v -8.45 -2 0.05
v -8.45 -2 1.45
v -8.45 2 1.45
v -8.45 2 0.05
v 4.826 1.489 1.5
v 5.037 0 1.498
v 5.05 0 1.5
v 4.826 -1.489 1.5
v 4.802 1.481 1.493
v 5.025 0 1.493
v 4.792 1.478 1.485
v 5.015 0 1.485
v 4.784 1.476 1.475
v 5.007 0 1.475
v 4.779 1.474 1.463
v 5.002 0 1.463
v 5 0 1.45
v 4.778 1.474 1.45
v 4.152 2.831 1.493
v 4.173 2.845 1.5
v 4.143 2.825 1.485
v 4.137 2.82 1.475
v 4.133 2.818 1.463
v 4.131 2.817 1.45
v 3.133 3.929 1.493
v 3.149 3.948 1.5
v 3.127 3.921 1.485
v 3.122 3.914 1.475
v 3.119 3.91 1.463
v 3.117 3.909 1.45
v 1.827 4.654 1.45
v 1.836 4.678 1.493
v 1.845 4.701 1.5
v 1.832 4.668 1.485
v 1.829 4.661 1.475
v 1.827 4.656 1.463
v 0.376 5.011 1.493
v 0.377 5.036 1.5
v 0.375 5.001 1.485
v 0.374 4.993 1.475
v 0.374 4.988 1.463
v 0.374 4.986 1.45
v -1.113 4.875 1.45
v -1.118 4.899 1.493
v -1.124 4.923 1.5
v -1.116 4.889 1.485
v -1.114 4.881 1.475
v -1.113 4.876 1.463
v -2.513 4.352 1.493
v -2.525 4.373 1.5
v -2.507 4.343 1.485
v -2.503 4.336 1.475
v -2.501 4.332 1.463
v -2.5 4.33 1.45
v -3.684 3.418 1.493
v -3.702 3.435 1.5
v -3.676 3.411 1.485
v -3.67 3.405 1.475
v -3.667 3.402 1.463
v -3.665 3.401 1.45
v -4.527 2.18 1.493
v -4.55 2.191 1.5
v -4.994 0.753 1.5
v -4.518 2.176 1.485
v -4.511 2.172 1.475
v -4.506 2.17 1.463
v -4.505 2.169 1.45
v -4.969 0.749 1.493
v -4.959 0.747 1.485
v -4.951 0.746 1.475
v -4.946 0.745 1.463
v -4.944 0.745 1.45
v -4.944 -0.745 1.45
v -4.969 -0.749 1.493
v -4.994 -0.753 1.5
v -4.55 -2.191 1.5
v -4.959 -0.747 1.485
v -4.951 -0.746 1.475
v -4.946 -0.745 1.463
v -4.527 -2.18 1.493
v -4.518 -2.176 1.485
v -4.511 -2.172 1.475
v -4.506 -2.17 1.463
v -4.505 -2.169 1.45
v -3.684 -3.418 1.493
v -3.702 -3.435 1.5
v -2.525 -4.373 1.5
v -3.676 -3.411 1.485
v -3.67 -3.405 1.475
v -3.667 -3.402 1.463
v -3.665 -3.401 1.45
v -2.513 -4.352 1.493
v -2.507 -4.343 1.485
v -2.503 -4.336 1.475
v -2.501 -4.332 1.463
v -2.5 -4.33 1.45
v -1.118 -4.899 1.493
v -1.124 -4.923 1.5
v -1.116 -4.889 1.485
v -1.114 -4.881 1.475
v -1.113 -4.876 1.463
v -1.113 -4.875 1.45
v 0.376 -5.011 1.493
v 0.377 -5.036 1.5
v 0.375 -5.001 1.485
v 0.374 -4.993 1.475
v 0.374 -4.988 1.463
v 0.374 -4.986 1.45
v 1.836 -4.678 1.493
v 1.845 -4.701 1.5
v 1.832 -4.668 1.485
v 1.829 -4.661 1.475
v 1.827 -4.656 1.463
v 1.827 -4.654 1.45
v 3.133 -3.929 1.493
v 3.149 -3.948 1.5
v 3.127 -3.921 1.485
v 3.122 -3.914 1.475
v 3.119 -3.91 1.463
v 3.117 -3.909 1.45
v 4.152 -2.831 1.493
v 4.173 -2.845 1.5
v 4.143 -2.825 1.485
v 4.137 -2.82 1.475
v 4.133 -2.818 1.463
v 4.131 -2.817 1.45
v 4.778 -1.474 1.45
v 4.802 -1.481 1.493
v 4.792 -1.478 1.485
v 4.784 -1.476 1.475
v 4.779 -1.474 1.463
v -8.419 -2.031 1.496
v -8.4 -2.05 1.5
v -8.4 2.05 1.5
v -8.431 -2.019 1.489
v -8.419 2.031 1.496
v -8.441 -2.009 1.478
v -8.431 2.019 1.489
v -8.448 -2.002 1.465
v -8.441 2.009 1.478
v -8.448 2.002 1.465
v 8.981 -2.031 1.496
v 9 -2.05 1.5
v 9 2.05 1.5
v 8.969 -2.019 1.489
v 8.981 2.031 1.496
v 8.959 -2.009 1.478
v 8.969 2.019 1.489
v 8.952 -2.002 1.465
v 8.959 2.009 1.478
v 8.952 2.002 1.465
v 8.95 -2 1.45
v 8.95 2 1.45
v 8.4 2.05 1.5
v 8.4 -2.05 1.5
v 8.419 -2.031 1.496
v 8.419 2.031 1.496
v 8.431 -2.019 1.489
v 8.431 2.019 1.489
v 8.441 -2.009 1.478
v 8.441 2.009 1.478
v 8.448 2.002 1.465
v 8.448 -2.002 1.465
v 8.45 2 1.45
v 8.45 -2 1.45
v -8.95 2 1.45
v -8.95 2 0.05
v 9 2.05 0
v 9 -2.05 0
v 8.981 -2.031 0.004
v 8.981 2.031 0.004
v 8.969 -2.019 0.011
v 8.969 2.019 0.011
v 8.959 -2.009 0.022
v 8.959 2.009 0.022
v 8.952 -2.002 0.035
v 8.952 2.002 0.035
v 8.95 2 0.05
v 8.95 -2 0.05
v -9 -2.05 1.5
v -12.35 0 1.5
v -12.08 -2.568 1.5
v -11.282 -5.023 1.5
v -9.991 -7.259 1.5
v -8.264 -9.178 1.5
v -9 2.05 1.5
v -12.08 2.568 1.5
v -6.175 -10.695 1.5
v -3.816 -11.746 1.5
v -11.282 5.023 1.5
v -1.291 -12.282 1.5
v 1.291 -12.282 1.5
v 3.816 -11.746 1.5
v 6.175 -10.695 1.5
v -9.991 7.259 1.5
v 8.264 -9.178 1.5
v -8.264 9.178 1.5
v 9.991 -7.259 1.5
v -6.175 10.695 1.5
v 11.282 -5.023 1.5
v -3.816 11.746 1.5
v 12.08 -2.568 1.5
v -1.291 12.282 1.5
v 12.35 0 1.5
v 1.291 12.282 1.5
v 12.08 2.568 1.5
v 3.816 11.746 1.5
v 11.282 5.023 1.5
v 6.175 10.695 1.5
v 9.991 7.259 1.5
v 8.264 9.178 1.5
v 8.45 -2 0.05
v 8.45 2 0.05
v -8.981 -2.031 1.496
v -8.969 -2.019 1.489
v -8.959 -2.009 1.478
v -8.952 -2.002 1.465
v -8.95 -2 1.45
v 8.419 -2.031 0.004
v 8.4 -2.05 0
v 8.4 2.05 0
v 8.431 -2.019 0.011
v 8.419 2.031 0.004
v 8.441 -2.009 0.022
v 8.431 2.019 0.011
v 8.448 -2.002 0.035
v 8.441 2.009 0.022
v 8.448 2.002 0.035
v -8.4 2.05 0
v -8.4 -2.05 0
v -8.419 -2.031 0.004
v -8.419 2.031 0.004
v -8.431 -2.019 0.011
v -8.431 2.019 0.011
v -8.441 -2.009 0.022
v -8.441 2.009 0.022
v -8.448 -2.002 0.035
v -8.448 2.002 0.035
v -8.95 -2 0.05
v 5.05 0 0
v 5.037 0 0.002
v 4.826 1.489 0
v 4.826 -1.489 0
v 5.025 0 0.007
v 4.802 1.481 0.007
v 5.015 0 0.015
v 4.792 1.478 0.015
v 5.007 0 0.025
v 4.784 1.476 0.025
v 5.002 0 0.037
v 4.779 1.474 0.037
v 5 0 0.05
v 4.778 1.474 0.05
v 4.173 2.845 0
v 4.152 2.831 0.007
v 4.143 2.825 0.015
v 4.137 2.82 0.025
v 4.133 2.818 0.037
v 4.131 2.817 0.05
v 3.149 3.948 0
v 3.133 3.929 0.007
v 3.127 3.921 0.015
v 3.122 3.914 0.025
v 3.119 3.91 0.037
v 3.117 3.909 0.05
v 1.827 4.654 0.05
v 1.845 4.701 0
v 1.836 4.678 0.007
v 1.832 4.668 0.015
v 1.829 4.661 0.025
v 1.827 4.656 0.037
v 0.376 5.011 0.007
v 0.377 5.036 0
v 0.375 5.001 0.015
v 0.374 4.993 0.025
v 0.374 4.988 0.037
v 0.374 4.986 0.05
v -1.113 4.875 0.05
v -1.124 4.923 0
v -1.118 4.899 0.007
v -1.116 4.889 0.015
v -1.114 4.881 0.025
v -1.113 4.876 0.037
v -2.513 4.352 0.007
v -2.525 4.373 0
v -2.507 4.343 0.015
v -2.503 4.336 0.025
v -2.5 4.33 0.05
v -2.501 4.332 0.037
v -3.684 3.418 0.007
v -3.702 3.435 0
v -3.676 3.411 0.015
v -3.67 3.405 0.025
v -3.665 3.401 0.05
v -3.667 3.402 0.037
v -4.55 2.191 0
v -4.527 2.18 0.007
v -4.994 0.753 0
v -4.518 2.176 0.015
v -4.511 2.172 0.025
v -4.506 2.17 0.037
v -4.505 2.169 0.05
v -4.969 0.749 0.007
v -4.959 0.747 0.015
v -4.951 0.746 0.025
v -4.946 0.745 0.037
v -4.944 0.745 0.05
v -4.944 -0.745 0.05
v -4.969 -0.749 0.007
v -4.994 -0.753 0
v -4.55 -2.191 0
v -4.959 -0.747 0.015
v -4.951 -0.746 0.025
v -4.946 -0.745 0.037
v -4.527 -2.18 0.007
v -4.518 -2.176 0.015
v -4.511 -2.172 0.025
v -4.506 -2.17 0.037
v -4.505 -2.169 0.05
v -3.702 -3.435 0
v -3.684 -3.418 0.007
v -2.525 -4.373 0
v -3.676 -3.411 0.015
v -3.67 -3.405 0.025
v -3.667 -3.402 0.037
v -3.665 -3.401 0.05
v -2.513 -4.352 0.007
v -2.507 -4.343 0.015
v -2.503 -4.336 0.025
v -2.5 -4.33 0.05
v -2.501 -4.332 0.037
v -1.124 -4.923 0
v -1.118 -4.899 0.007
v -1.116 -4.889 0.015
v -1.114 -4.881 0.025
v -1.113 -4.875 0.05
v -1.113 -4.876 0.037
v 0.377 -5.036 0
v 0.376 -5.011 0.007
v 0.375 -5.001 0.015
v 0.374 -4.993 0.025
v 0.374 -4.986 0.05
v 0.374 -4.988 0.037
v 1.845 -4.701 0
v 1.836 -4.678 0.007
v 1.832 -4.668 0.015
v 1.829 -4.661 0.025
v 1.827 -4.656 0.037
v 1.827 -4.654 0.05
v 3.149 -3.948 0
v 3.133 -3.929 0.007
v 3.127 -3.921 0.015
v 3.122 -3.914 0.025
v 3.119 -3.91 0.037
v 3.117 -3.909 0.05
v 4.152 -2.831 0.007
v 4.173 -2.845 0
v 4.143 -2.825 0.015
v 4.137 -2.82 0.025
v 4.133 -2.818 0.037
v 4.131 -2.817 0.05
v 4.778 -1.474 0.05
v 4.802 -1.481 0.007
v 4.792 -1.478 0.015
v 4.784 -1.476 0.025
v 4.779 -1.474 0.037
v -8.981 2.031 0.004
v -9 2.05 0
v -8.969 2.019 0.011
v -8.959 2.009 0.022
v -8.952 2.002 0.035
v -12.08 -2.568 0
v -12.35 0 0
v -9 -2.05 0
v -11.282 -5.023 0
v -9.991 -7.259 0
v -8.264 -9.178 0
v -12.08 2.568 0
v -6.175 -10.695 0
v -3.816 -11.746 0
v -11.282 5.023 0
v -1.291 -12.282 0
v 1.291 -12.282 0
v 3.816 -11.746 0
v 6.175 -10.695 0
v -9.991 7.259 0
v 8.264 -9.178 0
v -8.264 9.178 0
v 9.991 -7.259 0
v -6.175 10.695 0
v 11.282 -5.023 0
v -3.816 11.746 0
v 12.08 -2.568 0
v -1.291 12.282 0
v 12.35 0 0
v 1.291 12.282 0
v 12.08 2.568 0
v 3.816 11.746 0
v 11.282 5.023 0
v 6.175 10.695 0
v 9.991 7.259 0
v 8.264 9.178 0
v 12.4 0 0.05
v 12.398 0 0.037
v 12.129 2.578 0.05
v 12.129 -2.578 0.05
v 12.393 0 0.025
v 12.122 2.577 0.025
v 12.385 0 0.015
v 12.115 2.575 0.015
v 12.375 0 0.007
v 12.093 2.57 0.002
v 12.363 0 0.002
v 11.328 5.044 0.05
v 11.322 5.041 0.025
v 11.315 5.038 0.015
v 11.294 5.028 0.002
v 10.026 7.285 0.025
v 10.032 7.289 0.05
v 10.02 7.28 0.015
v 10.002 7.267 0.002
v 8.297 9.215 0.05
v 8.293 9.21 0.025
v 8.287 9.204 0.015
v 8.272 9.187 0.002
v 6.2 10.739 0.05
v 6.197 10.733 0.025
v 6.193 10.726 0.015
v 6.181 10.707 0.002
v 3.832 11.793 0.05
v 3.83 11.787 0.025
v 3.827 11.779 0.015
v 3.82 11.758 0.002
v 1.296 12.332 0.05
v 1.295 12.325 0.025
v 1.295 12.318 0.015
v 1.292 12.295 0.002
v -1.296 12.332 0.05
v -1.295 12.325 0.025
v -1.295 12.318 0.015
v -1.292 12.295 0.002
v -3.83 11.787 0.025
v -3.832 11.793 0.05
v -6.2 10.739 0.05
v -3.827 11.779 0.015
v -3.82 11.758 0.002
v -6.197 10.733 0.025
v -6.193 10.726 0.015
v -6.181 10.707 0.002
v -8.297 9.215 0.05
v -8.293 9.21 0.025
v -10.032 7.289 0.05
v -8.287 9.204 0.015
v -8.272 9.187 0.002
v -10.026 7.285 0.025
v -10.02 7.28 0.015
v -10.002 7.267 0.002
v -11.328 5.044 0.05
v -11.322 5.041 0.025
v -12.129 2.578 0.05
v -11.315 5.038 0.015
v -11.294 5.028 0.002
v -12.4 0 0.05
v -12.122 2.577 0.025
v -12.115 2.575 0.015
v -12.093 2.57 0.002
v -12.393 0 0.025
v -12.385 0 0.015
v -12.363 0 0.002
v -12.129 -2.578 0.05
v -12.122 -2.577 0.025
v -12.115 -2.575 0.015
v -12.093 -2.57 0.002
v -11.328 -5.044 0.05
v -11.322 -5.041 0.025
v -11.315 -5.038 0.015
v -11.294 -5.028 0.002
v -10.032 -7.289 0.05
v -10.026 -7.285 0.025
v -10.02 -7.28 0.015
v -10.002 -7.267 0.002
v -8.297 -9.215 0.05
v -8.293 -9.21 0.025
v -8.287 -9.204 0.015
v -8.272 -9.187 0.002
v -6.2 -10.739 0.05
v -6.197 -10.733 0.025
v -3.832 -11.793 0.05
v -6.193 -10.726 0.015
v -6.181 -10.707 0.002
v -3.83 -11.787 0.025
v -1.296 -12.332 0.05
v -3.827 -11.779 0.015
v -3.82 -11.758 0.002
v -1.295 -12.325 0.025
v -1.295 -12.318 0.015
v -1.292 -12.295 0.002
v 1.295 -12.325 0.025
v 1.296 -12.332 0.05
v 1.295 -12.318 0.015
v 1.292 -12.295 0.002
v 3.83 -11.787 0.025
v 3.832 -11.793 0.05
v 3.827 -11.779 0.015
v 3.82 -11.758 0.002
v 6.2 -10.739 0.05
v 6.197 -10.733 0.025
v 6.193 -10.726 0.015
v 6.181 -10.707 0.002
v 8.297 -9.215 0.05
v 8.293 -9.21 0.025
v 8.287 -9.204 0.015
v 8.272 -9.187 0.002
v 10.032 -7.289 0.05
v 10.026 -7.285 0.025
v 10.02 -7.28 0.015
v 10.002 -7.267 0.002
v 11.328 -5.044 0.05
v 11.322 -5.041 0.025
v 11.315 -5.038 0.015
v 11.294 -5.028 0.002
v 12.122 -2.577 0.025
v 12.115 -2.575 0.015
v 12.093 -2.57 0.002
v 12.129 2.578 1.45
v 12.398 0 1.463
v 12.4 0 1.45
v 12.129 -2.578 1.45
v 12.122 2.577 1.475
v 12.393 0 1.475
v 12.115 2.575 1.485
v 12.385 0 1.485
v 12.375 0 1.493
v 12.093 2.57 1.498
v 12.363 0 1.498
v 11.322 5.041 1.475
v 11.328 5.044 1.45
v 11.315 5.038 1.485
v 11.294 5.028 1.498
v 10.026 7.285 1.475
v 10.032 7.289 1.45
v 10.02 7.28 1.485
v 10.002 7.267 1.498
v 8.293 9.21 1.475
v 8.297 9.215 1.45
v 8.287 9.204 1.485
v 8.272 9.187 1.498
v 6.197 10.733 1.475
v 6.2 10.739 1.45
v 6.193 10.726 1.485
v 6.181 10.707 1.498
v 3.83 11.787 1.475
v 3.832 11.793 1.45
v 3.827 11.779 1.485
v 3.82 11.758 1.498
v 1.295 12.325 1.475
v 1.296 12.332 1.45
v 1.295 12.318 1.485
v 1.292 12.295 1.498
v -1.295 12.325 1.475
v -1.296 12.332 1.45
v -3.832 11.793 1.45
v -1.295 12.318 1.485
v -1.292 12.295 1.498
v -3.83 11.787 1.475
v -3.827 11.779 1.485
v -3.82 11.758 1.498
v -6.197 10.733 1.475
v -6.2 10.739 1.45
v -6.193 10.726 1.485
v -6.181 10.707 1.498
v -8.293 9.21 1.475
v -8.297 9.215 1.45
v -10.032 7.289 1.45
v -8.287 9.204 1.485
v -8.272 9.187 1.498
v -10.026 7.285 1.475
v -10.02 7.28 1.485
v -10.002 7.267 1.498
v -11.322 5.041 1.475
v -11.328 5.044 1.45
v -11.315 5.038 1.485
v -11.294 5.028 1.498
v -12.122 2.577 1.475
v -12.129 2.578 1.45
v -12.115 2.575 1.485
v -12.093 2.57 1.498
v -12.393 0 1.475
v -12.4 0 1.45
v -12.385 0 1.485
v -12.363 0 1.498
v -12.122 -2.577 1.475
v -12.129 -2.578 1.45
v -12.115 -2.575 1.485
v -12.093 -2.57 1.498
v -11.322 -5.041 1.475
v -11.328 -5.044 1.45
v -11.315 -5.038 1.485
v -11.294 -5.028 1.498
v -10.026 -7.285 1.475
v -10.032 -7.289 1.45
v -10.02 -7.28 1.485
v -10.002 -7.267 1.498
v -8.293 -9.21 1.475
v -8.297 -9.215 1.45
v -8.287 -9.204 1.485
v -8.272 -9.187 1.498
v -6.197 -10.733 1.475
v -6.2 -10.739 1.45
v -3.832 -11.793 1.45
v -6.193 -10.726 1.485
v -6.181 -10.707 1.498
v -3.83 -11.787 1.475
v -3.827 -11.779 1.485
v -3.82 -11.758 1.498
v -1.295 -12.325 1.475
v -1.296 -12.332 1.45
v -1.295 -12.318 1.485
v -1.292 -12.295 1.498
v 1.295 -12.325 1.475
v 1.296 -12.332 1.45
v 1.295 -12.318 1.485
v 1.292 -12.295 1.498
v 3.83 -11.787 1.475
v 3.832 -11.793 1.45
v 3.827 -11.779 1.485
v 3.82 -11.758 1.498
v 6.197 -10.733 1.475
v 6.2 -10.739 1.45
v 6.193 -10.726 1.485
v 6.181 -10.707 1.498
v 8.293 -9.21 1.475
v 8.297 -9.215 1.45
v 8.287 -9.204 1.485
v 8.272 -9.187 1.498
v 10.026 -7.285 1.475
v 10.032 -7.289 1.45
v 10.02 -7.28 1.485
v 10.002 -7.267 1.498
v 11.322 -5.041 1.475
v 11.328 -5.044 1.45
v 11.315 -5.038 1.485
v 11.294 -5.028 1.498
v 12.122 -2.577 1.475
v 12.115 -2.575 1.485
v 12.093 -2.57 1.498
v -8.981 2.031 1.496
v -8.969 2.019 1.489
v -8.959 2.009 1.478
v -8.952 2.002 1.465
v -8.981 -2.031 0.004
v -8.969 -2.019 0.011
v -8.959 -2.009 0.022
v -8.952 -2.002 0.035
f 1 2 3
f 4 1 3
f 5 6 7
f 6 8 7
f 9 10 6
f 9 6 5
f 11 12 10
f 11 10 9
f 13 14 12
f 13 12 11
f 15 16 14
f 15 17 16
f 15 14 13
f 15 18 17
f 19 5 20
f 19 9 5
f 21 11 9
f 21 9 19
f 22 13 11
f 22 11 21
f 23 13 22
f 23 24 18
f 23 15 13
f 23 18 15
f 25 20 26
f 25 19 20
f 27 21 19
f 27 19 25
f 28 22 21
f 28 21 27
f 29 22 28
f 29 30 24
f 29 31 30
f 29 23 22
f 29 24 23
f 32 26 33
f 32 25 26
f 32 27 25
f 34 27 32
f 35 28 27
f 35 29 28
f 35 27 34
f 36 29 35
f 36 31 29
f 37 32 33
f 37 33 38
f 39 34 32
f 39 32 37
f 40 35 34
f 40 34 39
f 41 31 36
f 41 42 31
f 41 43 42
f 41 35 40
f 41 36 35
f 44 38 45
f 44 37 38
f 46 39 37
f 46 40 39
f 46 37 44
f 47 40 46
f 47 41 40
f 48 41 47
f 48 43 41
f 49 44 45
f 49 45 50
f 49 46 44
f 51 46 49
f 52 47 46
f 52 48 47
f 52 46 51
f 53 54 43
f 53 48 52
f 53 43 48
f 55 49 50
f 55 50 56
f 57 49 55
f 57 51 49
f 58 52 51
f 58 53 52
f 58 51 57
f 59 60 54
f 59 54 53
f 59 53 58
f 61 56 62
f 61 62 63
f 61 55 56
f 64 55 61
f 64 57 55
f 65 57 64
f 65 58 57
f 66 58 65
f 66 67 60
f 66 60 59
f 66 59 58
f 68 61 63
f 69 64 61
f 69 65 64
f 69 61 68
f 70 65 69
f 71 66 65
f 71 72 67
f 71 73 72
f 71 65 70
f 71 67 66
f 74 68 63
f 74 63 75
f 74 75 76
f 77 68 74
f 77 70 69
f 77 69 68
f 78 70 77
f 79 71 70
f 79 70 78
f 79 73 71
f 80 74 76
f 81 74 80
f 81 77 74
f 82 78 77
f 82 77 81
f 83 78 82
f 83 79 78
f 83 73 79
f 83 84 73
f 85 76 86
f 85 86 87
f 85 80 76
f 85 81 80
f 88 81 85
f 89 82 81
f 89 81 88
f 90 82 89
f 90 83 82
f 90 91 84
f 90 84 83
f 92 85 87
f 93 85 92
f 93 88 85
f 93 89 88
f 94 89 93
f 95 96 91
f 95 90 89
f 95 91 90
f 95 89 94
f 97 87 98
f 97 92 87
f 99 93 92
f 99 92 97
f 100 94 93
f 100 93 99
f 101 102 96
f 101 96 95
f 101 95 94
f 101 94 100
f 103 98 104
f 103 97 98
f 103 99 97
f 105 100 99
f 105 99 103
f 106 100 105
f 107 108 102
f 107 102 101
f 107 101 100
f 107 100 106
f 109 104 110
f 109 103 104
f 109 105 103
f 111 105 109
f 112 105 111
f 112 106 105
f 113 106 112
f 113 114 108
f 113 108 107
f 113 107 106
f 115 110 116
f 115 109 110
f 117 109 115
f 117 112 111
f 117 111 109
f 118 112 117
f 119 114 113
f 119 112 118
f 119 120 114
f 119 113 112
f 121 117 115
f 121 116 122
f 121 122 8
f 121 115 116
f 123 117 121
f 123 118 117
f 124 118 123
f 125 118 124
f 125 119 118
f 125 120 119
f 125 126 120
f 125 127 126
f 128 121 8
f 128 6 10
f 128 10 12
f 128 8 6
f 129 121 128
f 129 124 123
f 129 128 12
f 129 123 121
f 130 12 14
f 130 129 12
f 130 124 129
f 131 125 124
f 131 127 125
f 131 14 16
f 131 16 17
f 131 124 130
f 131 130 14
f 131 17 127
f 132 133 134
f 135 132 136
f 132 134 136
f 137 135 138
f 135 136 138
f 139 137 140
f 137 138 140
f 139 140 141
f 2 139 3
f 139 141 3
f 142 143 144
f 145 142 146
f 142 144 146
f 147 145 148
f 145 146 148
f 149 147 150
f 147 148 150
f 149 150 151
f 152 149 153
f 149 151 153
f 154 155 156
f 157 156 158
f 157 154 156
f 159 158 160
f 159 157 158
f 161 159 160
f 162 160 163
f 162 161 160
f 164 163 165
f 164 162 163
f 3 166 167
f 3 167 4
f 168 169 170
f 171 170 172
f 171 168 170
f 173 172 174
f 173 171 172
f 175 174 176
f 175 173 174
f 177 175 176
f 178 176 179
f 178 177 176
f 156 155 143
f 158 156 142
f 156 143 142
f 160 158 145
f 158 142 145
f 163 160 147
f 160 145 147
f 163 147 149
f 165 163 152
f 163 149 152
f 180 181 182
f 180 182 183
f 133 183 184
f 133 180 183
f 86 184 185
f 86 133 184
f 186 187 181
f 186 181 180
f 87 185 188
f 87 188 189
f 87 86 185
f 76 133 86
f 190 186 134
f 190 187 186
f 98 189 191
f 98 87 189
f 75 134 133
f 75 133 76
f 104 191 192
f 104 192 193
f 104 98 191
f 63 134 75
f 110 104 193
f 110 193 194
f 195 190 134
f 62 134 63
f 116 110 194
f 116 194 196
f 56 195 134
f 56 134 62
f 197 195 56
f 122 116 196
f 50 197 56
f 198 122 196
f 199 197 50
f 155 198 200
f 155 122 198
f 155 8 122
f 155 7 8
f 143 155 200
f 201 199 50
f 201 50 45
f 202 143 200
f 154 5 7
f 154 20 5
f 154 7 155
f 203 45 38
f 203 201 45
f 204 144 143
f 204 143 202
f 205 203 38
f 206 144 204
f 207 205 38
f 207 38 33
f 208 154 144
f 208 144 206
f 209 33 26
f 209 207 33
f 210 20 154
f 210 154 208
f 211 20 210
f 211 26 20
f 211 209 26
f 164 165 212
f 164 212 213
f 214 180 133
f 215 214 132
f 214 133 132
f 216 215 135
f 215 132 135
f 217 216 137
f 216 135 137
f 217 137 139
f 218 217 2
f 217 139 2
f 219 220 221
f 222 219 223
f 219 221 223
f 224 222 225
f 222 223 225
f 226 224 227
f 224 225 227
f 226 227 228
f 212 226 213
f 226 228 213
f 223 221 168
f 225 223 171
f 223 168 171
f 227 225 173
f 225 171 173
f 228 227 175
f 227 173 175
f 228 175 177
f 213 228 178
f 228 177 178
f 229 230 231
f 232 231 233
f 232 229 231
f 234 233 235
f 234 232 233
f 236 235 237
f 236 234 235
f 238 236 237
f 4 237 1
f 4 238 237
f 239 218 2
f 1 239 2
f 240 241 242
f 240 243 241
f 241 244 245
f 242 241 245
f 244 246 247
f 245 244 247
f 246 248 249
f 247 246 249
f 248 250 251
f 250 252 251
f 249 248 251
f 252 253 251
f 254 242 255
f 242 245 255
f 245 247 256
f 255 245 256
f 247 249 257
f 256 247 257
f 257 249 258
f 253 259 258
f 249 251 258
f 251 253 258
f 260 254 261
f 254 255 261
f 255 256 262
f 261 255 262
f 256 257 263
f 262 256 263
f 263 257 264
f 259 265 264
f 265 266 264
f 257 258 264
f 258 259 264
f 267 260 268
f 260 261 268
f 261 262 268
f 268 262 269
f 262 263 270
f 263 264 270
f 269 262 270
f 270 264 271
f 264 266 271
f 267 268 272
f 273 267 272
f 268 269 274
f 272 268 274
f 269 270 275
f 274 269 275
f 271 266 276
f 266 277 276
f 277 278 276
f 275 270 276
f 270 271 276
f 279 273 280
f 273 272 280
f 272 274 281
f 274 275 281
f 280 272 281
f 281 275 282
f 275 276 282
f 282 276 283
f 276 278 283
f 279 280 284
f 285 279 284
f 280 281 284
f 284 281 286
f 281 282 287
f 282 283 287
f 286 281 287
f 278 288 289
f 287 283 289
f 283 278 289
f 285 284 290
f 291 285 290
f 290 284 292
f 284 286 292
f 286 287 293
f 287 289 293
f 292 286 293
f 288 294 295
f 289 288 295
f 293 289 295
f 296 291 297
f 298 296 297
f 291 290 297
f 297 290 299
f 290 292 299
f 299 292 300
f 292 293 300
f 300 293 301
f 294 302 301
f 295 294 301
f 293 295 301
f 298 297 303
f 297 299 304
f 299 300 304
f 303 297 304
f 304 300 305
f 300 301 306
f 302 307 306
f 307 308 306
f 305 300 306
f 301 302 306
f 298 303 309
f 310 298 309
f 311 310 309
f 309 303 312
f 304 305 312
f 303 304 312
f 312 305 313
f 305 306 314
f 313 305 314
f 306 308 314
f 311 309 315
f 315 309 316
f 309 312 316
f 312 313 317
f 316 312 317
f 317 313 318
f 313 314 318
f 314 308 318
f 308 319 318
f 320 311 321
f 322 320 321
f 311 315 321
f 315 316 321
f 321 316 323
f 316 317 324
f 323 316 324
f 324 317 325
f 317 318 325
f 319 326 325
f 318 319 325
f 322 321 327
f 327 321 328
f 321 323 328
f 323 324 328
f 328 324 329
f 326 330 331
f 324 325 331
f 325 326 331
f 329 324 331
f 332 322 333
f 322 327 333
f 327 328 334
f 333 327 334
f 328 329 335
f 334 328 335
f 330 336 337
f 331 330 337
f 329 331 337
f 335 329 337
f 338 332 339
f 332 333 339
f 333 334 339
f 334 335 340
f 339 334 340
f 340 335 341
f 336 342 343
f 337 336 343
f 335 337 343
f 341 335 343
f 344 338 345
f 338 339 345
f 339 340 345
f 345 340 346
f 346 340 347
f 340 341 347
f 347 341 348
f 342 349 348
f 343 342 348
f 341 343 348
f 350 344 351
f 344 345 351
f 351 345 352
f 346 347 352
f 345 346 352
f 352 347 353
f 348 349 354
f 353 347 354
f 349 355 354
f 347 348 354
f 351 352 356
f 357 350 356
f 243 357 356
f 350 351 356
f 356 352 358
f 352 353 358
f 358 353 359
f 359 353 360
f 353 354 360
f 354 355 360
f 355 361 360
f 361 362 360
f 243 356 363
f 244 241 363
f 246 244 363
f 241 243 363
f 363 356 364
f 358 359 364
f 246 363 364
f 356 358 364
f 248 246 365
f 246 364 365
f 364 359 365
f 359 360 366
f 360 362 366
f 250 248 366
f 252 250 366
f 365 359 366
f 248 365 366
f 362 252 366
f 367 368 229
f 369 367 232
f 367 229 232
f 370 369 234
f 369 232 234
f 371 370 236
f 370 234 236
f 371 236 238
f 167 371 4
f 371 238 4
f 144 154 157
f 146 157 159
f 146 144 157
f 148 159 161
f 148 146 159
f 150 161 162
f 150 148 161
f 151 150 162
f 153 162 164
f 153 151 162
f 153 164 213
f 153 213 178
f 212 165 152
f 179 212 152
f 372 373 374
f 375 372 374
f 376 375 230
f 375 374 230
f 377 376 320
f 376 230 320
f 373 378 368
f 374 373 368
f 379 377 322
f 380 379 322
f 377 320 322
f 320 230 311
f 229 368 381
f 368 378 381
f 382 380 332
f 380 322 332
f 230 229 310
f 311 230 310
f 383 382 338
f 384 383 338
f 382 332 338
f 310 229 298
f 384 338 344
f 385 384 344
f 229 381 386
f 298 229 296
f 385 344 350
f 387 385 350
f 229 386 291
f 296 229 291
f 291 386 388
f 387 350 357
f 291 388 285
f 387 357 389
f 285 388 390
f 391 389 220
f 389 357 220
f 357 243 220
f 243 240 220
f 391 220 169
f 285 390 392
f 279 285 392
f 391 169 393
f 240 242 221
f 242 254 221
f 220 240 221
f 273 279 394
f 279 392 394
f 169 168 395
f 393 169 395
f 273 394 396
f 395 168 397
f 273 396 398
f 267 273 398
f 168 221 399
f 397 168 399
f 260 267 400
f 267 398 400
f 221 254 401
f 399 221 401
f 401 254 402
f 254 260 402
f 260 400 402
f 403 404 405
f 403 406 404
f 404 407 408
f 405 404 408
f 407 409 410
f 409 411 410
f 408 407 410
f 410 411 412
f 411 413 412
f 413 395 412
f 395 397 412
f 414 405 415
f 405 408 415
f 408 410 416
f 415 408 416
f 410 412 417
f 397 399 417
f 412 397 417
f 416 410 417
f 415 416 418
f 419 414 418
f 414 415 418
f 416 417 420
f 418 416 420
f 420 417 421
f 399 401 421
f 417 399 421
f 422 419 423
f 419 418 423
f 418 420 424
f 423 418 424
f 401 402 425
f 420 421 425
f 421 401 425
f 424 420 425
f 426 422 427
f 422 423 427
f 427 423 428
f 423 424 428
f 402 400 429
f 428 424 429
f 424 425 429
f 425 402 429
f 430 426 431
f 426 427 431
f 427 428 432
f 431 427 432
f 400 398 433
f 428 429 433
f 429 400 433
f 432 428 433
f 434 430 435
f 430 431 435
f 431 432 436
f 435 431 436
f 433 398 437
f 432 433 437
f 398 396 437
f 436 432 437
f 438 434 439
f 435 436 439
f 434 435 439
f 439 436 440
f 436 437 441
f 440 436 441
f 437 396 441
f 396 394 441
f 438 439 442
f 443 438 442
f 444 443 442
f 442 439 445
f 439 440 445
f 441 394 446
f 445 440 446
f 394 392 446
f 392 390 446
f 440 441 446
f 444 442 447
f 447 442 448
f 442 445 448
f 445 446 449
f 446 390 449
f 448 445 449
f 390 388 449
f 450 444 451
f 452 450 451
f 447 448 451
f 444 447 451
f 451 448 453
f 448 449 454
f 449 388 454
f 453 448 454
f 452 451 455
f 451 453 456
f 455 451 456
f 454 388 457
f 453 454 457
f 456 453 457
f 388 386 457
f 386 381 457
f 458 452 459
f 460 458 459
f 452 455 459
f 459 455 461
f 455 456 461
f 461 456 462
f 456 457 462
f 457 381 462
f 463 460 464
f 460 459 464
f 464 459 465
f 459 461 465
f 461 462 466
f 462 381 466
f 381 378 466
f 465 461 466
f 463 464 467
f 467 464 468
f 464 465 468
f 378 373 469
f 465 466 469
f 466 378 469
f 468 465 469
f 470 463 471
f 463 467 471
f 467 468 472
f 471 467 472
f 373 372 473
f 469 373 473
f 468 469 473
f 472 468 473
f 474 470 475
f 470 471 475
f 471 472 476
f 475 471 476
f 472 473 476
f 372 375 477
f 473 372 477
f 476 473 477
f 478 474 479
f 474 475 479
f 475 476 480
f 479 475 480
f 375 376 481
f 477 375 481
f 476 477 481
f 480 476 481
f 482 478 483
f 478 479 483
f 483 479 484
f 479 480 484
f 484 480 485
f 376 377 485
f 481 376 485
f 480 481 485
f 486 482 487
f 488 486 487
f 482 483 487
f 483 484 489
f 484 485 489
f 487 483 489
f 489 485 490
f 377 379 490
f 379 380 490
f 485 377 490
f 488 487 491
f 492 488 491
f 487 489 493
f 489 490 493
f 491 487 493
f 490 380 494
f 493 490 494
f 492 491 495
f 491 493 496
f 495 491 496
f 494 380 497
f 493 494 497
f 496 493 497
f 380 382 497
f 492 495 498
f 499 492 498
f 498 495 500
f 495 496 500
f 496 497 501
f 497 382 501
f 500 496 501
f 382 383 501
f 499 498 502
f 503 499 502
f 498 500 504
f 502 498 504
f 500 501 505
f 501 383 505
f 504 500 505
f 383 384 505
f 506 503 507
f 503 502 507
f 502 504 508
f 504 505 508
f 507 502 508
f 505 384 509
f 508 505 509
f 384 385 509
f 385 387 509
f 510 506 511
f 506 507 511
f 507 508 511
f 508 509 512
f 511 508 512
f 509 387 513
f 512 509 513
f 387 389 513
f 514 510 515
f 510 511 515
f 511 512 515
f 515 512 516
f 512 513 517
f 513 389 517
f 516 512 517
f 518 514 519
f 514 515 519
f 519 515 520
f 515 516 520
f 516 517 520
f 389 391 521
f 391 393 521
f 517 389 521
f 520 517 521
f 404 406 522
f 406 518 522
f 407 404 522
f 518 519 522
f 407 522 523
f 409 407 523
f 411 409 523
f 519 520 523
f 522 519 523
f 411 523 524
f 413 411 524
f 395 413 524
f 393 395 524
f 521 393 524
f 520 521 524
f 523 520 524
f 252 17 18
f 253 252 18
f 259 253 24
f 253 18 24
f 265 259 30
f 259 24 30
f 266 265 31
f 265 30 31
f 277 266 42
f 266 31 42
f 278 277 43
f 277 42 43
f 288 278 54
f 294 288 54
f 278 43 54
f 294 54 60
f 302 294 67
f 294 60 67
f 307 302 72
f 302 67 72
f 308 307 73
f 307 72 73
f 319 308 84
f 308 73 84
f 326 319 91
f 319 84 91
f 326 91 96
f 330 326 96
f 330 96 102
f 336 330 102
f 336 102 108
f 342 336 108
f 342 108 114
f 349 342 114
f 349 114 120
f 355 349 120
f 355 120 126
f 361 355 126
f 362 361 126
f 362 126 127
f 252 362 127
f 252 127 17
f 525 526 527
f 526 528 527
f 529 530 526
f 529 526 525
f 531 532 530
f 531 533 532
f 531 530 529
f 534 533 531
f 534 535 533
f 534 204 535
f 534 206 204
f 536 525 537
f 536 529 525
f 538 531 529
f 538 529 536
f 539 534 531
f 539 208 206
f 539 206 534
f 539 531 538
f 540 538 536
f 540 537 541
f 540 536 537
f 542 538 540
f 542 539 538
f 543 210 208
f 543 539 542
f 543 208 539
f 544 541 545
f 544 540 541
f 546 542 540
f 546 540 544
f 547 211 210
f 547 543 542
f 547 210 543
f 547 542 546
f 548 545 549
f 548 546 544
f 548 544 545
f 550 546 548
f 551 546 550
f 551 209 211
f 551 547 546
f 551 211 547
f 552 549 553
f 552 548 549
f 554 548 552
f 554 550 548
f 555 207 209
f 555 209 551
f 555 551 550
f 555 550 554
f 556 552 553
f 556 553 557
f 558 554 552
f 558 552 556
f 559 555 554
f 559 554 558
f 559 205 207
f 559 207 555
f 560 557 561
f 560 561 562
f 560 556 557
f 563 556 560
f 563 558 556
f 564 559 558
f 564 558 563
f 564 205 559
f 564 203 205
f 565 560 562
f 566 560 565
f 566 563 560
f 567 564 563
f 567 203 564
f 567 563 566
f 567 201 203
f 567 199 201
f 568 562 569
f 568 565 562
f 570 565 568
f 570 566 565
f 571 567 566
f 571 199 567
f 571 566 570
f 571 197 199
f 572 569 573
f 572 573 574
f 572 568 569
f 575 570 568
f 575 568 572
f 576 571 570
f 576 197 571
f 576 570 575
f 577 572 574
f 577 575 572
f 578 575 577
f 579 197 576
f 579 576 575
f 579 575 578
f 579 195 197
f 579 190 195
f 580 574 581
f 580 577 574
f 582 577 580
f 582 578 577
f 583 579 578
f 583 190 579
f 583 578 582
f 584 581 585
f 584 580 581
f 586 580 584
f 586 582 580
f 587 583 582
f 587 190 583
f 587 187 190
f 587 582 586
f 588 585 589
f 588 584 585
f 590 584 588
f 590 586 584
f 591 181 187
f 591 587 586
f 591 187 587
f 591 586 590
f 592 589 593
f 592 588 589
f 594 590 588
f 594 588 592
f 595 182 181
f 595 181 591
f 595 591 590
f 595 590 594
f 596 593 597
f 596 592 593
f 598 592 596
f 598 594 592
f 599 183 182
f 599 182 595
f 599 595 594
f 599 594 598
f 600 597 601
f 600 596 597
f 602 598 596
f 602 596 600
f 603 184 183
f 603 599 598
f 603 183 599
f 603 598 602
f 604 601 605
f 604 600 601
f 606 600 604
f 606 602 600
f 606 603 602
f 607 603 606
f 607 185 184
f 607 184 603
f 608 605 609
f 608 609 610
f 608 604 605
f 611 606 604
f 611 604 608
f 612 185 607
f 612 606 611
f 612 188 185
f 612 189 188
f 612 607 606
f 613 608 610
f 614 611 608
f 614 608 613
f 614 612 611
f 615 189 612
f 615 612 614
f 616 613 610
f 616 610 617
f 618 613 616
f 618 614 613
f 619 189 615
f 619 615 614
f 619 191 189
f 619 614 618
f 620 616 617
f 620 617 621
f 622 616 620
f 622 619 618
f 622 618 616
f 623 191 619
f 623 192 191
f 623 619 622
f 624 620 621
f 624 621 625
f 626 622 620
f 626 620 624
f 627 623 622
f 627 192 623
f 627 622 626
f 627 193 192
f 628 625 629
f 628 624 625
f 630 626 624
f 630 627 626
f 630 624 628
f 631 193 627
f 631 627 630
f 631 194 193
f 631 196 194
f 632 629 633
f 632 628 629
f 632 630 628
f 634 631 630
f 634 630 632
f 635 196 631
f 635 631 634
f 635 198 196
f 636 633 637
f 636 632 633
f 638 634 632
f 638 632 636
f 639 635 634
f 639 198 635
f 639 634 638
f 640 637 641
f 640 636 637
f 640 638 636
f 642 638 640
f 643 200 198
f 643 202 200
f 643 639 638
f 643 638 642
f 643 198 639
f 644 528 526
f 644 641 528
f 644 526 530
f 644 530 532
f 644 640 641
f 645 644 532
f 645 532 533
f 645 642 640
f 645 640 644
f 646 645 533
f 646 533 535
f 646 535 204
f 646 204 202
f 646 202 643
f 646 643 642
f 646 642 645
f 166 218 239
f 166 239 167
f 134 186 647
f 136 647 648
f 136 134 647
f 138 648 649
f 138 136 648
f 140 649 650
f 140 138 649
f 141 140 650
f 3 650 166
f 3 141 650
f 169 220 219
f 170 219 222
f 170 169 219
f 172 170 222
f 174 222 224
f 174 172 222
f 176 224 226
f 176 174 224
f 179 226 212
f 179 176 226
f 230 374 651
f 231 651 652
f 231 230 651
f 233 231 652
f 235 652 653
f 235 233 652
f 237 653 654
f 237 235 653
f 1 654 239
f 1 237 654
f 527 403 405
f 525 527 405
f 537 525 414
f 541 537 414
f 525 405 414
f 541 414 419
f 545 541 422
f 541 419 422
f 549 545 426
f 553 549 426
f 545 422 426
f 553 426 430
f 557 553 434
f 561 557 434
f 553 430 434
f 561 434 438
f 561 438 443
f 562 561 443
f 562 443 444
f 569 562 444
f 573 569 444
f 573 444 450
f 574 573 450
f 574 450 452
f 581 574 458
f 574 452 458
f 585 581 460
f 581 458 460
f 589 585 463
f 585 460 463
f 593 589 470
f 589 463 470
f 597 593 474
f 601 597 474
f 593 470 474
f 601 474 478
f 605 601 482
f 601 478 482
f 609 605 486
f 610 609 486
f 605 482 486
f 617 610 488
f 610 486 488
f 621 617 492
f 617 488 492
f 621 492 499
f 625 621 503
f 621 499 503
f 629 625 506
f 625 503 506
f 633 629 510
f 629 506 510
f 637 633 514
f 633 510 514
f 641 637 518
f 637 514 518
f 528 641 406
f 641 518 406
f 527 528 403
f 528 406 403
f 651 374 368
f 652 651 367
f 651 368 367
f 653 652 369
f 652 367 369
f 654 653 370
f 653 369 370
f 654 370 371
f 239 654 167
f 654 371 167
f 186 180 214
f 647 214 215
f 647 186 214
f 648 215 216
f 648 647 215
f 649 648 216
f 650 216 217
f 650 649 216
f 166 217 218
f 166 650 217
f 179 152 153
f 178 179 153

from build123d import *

# Parameters (mm, degrees)
SKETCH1_R           = 12.4
BOSS_EXTRUDE1_DEPTH = 1.5
SKETCH2_R           = 5
SKETCH2_W           = 0.5
SKETCH2_H           = 4
CUT_EXTRUDE1_DEPTH  = 2.5
FILLET1_R           = 0.05


with BuildPart() as part:
    # Sketch1 → Boss-Extrude1 (new body)
    with BuildSketch(Plane.XY):
        Circle(SKETCH1_R)
    extrude(amount=BOSS_EXTRUDE1_DEPTH)

    # Sketch2 → Cut-Extrude1 (cut, through all)
    with BuildSketch(Plane.XY.offset(1.5)):
        Circle(SKETCH2_R)
        with Locations((-8.7, 0)):
            Rectangle(SKETCH2_W, SKETCH2_H)
        with Locations((8.7, 0)):
            Rectangle(SKETCH2_W, SKETCH2_H)
    extrude(amount=-CUT_EXTRUDE1_DEPTH, mode=Mode.SUBTRACT)

    # Fillet1
    fillet1_edges = [part.edges().sort_by_distance(p)[0] for p in [
        (-8.95, 0, 0),
        (-8.7, 2, 0),
        (-8.45, 0, 0),
        (-8.7, -2, 0),
        (-8.95, 0, 1.5),
        (-8.7, -2, 1.5),
        (-8.45, 0, 1.5),
        (-8.7, 2, 1.5),
        (-12.4, 0, 0),
        (8.45, 0, 0),
        (8.7, 2, 0),
        (8.95, 0, 0),
        (8.7, -2, 0),
        (8.45, 0, 1.5),
        (8.7, -2, 1.5),
        (8.95, 0, 1.5),
        (8.7, 2, 1.5),
        (-12.4, 0, 1.5),
        (-5, 0, 0),
        (-5, 0, 1.5),
    ]]
    fillet(fillet1_edges, radius=FILLET1_R)


solid = part.part
